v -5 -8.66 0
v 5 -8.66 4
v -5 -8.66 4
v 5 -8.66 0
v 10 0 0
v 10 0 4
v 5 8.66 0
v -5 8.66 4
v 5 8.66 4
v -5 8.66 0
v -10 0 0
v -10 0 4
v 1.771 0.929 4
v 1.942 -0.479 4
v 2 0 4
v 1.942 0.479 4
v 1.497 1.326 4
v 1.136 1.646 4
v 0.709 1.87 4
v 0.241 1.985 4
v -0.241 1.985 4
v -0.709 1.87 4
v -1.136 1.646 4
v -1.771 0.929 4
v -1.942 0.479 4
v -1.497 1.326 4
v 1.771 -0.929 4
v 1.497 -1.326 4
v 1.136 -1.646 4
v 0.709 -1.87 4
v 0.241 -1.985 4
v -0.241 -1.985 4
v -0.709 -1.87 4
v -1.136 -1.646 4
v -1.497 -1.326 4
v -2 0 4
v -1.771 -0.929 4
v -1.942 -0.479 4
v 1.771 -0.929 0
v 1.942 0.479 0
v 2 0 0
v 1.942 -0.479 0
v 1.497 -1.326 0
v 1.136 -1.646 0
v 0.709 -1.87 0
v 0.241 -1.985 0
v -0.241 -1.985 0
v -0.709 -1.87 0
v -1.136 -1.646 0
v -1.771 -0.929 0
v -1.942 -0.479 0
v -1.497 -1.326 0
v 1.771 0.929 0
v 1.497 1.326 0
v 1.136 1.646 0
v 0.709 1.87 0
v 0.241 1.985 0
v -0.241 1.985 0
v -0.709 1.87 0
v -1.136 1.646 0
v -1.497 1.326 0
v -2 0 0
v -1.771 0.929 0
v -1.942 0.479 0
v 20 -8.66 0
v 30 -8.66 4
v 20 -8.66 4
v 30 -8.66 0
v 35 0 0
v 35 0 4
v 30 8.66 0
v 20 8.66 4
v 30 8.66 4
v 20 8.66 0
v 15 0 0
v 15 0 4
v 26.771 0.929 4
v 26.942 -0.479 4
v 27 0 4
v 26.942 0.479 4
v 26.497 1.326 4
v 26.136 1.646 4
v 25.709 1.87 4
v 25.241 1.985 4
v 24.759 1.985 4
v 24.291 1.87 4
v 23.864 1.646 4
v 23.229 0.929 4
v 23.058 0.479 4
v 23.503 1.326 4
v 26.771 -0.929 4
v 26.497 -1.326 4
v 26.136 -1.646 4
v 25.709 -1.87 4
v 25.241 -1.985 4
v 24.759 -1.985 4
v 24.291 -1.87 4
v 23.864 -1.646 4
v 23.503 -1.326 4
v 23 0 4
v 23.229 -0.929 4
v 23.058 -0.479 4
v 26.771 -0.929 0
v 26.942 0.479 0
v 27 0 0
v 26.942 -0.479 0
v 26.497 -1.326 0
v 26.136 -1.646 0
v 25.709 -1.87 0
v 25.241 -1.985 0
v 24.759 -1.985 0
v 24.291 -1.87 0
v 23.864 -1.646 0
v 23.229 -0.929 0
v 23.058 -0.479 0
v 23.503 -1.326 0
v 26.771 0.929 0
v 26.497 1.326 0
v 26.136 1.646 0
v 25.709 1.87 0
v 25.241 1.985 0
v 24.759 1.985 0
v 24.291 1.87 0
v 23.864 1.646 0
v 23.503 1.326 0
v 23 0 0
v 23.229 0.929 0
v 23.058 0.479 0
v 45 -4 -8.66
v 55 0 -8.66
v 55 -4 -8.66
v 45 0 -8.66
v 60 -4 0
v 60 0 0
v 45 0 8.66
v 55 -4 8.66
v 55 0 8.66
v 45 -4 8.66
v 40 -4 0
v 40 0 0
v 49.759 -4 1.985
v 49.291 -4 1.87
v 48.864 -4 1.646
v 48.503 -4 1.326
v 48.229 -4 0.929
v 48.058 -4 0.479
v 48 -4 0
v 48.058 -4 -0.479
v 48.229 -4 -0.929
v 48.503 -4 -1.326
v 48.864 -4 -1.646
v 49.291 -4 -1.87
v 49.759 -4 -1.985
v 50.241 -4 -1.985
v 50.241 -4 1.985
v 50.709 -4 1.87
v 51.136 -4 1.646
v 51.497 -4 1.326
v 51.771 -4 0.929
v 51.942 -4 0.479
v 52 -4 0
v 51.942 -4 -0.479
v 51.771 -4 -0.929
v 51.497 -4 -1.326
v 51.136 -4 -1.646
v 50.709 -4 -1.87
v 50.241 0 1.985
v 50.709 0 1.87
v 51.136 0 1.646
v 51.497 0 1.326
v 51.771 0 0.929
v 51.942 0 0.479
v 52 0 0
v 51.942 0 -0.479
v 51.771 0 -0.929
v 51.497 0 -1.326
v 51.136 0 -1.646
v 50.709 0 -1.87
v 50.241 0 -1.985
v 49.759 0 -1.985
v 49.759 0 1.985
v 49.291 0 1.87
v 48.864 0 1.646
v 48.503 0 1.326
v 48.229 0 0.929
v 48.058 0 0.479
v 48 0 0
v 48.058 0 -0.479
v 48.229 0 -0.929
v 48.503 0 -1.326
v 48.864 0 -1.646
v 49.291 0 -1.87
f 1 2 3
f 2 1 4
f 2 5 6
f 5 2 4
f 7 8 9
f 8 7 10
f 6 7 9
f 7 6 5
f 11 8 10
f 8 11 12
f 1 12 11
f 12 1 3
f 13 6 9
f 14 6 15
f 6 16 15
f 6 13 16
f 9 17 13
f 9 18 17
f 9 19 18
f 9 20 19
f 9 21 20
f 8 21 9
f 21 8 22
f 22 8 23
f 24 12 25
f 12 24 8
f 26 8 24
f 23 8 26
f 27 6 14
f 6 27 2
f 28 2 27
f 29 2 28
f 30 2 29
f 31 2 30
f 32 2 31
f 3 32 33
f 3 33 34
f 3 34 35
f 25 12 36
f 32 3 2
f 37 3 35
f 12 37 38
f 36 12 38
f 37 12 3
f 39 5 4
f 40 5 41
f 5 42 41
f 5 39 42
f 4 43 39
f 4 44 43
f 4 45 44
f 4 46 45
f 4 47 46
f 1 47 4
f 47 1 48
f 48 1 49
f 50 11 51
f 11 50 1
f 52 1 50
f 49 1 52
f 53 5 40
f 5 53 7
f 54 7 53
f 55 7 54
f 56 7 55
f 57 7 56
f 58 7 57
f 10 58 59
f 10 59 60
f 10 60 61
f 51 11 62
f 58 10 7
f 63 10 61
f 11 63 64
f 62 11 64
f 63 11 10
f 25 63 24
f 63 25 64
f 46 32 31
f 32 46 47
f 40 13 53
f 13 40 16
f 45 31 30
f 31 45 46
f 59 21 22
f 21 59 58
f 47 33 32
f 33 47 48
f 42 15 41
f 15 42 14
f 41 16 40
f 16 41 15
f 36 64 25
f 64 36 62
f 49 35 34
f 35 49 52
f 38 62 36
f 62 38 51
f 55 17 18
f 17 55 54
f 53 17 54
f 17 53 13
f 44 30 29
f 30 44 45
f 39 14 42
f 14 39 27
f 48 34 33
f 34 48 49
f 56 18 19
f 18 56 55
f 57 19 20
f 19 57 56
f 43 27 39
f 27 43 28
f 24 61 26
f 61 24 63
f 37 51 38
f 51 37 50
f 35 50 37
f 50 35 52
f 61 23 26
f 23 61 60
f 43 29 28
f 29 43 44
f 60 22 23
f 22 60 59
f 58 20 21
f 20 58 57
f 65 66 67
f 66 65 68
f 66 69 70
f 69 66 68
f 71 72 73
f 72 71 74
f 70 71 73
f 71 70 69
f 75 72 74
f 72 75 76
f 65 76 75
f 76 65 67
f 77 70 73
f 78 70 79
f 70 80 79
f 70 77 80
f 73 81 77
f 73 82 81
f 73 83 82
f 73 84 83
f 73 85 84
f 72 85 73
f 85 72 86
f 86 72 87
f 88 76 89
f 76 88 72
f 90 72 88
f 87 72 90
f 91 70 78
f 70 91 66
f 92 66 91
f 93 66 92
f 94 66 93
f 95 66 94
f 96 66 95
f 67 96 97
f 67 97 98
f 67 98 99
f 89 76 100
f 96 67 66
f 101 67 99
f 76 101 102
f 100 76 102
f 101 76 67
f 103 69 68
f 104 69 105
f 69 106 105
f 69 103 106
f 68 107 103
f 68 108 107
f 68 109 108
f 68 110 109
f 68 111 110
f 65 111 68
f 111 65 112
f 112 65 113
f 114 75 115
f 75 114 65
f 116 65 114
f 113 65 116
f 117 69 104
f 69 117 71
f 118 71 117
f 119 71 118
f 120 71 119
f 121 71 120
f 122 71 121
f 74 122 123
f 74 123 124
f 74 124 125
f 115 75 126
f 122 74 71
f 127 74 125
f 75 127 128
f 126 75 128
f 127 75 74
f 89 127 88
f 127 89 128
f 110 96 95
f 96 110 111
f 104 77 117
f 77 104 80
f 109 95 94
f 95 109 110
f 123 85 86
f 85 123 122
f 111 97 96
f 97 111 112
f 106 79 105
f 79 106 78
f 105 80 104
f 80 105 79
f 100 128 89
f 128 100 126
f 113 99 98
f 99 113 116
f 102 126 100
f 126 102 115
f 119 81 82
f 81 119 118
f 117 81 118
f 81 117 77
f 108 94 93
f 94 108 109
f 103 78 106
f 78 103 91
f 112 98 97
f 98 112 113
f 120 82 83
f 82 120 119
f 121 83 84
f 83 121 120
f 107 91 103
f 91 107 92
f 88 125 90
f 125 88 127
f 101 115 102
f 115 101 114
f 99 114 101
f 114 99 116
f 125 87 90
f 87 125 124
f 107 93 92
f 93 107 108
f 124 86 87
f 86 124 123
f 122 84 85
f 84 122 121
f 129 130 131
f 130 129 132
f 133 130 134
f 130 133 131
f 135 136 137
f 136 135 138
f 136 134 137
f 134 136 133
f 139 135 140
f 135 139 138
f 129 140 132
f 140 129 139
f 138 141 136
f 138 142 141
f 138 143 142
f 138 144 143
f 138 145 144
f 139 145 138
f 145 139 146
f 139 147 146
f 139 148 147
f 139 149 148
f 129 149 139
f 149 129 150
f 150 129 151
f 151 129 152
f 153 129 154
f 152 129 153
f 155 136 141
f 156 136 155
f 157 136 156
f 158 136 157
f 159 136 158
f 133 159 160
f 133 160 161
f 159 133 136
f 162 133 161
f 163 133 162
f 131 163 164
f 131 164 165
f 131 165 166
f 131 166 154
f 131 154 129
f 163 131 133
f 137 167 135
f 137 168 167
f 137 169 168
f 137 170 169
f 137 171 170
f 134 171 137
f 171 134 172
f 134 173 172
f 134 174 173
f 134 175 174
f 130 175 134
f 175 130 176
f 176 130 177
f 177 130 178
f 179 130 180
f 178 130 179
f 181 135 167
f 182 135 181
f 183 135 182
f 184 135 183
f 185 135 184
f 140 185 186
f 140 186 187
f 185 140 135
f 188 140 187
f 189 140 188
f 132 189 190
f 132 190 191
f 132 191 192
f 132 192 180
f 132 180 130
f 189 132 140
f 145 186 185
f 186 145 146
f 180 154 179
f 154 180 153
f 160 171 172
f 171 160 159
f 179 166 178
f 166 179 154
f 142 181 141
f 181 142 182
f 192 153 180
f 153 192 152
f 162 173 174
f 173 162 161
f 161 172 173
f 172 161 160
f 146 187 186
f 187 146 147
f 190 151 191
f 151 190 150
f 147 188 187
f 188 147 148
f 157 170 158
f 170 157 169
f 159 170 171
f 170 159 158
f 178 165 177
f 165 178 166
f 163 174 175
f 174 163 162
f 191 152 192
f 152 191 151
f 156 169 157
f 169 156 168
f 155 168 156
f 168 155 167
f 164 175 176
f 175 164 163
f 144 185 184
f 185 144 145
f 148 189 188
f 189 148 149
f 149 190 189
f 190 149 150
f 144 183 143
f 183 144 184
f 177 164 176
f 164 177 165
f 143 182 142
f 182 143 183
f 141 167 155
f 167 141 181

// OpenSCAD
module piulita()
{
    difference(){
        cylinder(h = 4, r = 10, $fn = 6);
    
        translate ([0, 0, -1]) cylinder(h = 6, r = 2, $fn = 26);
    }
}

color ("red") piulita();
color ("yellow") translate ([25, 0, 0]) piulita();

color("blue") translate ([50, 0, 0]) rotate([90, 0, 0]) piulita();
